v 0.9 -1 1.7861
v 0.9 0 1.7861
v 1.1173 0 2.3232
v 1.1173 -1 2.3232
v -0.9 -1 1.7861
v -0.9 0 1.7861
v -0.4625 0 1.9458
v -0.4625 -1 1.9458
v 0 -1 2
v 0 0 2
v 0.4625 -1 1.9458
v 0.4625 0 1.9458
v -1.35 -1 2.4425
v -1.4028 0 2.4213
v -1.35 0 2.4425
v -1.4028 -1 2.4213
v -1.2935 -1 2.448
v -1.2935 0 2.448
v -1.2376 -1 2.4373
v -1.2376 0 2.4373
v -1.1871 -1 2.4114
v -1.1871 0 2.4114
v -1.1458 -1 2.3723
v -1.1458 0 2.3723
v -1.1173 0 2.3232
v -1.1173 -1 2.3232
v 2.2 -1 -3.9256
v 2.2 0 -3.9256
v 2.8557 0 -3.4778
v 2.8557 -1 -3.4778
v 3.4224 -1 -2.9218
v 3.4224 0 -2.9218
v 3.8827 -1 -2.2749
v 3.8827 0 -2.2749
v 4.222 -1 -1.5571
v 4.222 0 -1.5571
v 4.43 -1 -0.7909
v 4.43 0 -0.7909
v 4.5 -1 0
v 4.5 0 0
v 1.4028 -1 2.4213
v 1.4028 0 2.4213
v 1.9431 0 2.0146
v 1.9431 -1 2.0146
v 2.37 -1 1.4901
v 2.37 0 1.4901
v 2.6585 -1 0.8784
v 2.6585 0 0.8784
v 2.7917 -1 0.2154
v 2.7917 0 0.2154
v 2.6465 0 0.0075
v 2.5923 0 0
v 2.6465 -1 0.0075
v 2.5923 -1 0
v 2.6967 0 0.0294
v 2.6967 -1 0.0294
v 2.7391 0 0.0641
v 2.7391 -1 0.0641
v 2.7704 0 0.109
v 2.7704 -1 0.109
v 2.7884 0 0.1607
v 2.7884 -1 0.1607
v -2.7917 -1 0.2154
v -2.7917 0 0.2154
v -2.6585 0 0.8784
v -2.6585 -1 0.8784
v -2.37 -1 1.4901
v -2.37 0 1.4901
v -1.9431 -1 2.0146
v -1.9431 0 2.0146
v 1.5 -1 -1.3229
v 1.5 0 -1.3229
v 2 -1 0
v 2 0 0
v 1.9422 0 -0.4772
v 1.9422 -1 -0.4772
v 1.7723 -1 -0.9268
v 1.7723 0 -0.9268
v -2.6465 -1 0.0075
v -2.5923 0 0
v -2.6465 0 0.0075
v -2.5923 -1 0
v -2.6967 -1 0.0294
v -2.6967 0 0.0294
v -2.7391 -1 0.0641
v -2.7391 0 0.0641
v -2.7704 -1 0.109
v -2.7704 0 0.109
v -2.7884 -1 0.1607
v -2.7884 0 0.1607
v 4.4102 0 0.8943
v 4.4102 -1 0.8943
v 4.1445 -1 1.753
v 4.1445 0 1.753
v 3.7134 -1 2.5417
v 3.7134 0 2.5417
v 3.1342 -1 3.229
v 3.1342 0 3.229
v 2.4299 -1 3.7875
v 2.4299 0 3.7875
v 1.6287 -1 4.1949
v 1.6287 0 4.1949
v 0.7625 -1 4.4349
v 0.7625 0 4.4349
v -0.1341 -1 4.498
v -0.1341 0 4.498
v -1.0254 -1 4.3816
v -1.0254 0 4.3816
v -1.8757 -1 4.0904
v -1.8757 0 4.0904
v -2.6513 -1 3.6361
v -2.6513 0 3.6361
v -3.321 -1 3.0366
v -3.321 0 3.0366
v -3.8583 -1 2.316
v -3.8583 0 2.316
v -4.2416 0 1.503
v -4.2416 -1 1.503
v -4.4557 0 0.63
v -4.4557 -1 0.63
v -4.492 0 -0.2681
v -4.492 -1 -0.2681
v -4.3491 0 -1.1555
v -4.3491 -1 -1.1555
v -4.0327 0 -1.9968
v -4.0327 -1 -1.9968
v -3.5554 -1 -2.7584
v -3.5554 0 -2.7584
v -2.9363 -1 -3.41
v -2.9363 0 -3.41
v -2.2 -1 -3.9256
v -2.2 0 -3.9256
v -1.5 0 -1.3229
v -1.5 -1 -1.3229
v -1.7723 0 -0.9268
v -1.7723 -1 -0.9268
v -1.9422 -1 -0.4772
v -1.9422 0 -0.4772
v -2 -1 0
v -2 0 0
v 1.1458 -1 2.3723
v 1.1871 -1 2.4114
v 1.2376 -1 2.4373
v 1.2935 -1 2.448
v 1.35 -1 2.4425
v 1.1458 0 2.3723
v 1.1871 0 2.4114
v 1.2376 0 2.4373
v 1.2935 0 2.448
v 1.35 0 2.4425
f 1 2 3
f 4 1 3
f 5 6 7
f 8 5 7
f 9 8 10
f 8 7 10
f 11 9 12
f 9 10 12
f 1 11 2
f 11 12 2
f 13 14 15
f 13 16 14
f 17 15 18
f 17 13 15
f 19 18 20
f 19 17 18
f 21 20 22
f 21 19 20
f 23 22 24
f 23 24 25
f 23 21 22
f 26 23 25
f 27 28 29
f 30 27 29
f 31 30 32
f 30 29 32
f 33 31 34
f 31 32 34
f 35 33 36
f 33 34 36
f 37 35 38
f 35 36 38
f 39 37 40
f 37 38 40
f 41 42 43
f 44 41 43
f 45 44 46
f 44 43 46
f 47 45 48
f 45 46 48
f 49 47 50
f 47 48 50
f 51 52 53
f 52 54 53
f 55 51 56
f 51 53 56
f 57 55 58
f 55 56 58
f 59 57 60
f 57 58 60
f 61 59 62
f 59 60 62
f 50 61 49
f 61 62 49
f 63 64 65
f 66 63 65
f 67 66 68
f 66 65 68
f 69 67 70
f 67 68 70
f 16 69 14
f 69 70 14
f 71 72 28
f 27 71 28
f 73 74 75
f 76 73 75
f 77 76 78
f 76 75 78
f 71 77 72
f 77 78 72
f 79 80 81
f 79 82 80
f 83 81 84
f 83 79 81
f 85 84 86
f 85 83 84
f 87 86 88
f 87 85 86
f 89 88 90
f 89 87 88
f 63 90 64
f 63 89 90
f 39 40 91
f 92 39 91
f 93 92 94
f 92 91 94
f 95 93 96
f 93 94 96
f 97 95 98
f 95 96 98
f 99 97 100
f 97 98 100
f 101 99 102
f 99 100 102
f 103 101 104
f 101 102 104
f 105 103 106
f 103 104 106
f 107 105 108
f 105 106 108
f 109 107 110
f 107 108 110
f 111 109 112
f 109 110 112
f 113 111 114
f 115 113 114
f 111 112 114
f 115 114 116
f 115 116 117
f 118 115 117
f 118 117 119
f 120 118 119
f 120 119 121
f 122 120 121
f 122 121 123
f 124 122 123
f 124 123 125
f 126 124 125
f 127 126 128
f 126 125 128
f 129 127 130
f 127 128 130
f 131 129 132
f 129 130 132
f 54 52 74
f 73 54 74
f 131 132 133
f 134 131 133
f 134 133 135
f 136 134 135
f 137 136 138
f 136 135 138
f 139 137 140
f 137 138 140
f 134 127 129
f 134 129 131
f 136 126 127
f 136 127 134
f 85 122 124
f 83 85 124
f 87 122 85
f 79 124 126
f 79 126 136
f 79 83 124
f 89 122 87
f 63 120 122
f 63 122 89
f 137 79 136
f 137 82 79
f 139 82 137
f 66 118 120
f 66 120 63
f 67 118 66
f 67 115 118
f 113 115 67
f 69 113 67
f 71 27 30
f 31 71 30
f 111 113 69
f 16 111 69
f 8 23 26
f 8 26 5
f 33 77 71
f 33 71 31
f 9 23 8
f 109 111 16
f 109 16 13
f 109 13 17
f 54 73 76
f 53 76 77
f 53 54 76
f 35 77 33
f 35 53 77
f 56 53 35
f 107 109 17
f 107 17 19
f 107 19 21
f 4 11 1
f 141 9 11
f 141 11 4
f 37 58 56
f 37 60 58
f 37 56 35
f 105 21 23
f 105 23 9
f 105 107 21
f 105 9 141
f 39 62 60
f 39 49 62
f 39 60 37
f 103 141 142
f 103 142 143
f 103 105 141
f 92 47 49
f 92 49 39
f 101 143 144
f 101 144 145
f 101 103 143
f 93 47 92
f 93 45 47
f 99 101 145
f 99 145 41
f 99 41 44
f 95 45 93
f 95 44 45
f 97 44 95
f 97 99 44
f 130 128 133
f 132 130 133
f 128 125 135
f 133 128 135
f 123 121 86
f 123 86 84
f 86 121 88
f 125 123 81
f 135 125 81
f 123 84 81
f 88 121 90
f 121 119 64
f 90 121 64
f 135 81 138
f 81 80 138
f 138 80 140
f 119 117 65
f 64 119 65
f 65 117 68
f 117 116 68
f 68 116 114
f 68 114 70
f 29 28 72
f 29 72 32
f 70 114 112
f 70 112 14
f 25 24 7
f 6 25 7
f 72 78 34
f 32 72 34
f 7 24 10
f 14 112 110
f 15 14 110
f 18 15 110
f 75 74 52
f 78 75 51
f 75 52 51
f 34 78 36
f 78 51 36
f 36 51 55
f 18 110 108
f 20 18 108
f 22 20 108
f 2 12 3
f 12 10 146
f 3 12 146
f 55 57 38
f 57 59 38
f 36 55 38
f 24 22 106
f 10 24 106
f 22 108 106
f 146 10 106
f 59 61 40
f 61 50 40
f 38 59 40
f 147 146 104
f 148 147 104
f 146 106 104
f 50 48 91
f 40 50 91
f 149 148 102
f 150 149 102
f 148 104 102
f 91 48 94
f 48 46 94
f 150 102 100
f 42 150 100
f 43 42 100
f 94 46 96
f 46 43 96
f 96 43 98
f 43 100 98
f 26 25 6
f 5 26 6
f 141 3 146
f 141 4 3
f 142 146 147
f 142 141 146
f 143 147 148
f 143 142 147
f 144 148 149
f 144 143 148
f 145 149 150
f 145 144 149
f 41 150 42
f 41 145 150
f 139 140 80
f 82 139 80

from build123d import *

# Parameters (mm, degrees)
F1_DEPTH = 1
F2_R     = 0.2


with BuildPart() as f1:
    # F0 (on Front) → F1 (new body)
    with BuildSketch(Plane.XZ):
        with BuildLine():
            Line((2.8, 0), (2, 0))
            ThreePointArc((2, 0), (1.870829, -0.707107), (1.5, -1.322876))
            Line((1.5, -1.322876), (2.2, -3.925557))
            ThreePointArc((2.2, -3.925557), (3.882654, -2.274863), (4.5, 0))
            ThreePointArc((4.5, 0), (-2.274863, 3.882654), (-2.2, -3.925557))
            Line((-2.2, -3.925557), (-1.5, -1.322876))
            ThreePointArc((-1.5, -1.322876), (-1.870829, -0.707107), (-2, 0))
            Line((-2, 0), (-2.8, 0))
            ThreePointArc((-2.8, 0), (-2.366384, 1.495757), (-1.2, 2.527677))
            Line((-1.2, 2.527677), (-0.9, 1.786057))
            ThreePointArc((-0.9, 1.786057), (0, 2), (0.9, 1.786057))
            Line((0.9, 1.786057), (1.2, 2.527677))
            ThreePointArc((1.2, 2.527677), (2.366384, 1.495757), (2.8, 0))
        make_face()
    extrude(amount=F1_DEPTH)

    # F2
    f2_edges = [f1.edges().sort_by_distance(p)[0] for p in [
        (-1.2, -0.5, 2.527677),
        (1.2, -0.5, 2.527677),
        (2.8, -0.5, 0),
        (-2.8, -0.5, 0),
    ]]
    fillet(f2_edges, radius=F2_R)


solid = f1.part
